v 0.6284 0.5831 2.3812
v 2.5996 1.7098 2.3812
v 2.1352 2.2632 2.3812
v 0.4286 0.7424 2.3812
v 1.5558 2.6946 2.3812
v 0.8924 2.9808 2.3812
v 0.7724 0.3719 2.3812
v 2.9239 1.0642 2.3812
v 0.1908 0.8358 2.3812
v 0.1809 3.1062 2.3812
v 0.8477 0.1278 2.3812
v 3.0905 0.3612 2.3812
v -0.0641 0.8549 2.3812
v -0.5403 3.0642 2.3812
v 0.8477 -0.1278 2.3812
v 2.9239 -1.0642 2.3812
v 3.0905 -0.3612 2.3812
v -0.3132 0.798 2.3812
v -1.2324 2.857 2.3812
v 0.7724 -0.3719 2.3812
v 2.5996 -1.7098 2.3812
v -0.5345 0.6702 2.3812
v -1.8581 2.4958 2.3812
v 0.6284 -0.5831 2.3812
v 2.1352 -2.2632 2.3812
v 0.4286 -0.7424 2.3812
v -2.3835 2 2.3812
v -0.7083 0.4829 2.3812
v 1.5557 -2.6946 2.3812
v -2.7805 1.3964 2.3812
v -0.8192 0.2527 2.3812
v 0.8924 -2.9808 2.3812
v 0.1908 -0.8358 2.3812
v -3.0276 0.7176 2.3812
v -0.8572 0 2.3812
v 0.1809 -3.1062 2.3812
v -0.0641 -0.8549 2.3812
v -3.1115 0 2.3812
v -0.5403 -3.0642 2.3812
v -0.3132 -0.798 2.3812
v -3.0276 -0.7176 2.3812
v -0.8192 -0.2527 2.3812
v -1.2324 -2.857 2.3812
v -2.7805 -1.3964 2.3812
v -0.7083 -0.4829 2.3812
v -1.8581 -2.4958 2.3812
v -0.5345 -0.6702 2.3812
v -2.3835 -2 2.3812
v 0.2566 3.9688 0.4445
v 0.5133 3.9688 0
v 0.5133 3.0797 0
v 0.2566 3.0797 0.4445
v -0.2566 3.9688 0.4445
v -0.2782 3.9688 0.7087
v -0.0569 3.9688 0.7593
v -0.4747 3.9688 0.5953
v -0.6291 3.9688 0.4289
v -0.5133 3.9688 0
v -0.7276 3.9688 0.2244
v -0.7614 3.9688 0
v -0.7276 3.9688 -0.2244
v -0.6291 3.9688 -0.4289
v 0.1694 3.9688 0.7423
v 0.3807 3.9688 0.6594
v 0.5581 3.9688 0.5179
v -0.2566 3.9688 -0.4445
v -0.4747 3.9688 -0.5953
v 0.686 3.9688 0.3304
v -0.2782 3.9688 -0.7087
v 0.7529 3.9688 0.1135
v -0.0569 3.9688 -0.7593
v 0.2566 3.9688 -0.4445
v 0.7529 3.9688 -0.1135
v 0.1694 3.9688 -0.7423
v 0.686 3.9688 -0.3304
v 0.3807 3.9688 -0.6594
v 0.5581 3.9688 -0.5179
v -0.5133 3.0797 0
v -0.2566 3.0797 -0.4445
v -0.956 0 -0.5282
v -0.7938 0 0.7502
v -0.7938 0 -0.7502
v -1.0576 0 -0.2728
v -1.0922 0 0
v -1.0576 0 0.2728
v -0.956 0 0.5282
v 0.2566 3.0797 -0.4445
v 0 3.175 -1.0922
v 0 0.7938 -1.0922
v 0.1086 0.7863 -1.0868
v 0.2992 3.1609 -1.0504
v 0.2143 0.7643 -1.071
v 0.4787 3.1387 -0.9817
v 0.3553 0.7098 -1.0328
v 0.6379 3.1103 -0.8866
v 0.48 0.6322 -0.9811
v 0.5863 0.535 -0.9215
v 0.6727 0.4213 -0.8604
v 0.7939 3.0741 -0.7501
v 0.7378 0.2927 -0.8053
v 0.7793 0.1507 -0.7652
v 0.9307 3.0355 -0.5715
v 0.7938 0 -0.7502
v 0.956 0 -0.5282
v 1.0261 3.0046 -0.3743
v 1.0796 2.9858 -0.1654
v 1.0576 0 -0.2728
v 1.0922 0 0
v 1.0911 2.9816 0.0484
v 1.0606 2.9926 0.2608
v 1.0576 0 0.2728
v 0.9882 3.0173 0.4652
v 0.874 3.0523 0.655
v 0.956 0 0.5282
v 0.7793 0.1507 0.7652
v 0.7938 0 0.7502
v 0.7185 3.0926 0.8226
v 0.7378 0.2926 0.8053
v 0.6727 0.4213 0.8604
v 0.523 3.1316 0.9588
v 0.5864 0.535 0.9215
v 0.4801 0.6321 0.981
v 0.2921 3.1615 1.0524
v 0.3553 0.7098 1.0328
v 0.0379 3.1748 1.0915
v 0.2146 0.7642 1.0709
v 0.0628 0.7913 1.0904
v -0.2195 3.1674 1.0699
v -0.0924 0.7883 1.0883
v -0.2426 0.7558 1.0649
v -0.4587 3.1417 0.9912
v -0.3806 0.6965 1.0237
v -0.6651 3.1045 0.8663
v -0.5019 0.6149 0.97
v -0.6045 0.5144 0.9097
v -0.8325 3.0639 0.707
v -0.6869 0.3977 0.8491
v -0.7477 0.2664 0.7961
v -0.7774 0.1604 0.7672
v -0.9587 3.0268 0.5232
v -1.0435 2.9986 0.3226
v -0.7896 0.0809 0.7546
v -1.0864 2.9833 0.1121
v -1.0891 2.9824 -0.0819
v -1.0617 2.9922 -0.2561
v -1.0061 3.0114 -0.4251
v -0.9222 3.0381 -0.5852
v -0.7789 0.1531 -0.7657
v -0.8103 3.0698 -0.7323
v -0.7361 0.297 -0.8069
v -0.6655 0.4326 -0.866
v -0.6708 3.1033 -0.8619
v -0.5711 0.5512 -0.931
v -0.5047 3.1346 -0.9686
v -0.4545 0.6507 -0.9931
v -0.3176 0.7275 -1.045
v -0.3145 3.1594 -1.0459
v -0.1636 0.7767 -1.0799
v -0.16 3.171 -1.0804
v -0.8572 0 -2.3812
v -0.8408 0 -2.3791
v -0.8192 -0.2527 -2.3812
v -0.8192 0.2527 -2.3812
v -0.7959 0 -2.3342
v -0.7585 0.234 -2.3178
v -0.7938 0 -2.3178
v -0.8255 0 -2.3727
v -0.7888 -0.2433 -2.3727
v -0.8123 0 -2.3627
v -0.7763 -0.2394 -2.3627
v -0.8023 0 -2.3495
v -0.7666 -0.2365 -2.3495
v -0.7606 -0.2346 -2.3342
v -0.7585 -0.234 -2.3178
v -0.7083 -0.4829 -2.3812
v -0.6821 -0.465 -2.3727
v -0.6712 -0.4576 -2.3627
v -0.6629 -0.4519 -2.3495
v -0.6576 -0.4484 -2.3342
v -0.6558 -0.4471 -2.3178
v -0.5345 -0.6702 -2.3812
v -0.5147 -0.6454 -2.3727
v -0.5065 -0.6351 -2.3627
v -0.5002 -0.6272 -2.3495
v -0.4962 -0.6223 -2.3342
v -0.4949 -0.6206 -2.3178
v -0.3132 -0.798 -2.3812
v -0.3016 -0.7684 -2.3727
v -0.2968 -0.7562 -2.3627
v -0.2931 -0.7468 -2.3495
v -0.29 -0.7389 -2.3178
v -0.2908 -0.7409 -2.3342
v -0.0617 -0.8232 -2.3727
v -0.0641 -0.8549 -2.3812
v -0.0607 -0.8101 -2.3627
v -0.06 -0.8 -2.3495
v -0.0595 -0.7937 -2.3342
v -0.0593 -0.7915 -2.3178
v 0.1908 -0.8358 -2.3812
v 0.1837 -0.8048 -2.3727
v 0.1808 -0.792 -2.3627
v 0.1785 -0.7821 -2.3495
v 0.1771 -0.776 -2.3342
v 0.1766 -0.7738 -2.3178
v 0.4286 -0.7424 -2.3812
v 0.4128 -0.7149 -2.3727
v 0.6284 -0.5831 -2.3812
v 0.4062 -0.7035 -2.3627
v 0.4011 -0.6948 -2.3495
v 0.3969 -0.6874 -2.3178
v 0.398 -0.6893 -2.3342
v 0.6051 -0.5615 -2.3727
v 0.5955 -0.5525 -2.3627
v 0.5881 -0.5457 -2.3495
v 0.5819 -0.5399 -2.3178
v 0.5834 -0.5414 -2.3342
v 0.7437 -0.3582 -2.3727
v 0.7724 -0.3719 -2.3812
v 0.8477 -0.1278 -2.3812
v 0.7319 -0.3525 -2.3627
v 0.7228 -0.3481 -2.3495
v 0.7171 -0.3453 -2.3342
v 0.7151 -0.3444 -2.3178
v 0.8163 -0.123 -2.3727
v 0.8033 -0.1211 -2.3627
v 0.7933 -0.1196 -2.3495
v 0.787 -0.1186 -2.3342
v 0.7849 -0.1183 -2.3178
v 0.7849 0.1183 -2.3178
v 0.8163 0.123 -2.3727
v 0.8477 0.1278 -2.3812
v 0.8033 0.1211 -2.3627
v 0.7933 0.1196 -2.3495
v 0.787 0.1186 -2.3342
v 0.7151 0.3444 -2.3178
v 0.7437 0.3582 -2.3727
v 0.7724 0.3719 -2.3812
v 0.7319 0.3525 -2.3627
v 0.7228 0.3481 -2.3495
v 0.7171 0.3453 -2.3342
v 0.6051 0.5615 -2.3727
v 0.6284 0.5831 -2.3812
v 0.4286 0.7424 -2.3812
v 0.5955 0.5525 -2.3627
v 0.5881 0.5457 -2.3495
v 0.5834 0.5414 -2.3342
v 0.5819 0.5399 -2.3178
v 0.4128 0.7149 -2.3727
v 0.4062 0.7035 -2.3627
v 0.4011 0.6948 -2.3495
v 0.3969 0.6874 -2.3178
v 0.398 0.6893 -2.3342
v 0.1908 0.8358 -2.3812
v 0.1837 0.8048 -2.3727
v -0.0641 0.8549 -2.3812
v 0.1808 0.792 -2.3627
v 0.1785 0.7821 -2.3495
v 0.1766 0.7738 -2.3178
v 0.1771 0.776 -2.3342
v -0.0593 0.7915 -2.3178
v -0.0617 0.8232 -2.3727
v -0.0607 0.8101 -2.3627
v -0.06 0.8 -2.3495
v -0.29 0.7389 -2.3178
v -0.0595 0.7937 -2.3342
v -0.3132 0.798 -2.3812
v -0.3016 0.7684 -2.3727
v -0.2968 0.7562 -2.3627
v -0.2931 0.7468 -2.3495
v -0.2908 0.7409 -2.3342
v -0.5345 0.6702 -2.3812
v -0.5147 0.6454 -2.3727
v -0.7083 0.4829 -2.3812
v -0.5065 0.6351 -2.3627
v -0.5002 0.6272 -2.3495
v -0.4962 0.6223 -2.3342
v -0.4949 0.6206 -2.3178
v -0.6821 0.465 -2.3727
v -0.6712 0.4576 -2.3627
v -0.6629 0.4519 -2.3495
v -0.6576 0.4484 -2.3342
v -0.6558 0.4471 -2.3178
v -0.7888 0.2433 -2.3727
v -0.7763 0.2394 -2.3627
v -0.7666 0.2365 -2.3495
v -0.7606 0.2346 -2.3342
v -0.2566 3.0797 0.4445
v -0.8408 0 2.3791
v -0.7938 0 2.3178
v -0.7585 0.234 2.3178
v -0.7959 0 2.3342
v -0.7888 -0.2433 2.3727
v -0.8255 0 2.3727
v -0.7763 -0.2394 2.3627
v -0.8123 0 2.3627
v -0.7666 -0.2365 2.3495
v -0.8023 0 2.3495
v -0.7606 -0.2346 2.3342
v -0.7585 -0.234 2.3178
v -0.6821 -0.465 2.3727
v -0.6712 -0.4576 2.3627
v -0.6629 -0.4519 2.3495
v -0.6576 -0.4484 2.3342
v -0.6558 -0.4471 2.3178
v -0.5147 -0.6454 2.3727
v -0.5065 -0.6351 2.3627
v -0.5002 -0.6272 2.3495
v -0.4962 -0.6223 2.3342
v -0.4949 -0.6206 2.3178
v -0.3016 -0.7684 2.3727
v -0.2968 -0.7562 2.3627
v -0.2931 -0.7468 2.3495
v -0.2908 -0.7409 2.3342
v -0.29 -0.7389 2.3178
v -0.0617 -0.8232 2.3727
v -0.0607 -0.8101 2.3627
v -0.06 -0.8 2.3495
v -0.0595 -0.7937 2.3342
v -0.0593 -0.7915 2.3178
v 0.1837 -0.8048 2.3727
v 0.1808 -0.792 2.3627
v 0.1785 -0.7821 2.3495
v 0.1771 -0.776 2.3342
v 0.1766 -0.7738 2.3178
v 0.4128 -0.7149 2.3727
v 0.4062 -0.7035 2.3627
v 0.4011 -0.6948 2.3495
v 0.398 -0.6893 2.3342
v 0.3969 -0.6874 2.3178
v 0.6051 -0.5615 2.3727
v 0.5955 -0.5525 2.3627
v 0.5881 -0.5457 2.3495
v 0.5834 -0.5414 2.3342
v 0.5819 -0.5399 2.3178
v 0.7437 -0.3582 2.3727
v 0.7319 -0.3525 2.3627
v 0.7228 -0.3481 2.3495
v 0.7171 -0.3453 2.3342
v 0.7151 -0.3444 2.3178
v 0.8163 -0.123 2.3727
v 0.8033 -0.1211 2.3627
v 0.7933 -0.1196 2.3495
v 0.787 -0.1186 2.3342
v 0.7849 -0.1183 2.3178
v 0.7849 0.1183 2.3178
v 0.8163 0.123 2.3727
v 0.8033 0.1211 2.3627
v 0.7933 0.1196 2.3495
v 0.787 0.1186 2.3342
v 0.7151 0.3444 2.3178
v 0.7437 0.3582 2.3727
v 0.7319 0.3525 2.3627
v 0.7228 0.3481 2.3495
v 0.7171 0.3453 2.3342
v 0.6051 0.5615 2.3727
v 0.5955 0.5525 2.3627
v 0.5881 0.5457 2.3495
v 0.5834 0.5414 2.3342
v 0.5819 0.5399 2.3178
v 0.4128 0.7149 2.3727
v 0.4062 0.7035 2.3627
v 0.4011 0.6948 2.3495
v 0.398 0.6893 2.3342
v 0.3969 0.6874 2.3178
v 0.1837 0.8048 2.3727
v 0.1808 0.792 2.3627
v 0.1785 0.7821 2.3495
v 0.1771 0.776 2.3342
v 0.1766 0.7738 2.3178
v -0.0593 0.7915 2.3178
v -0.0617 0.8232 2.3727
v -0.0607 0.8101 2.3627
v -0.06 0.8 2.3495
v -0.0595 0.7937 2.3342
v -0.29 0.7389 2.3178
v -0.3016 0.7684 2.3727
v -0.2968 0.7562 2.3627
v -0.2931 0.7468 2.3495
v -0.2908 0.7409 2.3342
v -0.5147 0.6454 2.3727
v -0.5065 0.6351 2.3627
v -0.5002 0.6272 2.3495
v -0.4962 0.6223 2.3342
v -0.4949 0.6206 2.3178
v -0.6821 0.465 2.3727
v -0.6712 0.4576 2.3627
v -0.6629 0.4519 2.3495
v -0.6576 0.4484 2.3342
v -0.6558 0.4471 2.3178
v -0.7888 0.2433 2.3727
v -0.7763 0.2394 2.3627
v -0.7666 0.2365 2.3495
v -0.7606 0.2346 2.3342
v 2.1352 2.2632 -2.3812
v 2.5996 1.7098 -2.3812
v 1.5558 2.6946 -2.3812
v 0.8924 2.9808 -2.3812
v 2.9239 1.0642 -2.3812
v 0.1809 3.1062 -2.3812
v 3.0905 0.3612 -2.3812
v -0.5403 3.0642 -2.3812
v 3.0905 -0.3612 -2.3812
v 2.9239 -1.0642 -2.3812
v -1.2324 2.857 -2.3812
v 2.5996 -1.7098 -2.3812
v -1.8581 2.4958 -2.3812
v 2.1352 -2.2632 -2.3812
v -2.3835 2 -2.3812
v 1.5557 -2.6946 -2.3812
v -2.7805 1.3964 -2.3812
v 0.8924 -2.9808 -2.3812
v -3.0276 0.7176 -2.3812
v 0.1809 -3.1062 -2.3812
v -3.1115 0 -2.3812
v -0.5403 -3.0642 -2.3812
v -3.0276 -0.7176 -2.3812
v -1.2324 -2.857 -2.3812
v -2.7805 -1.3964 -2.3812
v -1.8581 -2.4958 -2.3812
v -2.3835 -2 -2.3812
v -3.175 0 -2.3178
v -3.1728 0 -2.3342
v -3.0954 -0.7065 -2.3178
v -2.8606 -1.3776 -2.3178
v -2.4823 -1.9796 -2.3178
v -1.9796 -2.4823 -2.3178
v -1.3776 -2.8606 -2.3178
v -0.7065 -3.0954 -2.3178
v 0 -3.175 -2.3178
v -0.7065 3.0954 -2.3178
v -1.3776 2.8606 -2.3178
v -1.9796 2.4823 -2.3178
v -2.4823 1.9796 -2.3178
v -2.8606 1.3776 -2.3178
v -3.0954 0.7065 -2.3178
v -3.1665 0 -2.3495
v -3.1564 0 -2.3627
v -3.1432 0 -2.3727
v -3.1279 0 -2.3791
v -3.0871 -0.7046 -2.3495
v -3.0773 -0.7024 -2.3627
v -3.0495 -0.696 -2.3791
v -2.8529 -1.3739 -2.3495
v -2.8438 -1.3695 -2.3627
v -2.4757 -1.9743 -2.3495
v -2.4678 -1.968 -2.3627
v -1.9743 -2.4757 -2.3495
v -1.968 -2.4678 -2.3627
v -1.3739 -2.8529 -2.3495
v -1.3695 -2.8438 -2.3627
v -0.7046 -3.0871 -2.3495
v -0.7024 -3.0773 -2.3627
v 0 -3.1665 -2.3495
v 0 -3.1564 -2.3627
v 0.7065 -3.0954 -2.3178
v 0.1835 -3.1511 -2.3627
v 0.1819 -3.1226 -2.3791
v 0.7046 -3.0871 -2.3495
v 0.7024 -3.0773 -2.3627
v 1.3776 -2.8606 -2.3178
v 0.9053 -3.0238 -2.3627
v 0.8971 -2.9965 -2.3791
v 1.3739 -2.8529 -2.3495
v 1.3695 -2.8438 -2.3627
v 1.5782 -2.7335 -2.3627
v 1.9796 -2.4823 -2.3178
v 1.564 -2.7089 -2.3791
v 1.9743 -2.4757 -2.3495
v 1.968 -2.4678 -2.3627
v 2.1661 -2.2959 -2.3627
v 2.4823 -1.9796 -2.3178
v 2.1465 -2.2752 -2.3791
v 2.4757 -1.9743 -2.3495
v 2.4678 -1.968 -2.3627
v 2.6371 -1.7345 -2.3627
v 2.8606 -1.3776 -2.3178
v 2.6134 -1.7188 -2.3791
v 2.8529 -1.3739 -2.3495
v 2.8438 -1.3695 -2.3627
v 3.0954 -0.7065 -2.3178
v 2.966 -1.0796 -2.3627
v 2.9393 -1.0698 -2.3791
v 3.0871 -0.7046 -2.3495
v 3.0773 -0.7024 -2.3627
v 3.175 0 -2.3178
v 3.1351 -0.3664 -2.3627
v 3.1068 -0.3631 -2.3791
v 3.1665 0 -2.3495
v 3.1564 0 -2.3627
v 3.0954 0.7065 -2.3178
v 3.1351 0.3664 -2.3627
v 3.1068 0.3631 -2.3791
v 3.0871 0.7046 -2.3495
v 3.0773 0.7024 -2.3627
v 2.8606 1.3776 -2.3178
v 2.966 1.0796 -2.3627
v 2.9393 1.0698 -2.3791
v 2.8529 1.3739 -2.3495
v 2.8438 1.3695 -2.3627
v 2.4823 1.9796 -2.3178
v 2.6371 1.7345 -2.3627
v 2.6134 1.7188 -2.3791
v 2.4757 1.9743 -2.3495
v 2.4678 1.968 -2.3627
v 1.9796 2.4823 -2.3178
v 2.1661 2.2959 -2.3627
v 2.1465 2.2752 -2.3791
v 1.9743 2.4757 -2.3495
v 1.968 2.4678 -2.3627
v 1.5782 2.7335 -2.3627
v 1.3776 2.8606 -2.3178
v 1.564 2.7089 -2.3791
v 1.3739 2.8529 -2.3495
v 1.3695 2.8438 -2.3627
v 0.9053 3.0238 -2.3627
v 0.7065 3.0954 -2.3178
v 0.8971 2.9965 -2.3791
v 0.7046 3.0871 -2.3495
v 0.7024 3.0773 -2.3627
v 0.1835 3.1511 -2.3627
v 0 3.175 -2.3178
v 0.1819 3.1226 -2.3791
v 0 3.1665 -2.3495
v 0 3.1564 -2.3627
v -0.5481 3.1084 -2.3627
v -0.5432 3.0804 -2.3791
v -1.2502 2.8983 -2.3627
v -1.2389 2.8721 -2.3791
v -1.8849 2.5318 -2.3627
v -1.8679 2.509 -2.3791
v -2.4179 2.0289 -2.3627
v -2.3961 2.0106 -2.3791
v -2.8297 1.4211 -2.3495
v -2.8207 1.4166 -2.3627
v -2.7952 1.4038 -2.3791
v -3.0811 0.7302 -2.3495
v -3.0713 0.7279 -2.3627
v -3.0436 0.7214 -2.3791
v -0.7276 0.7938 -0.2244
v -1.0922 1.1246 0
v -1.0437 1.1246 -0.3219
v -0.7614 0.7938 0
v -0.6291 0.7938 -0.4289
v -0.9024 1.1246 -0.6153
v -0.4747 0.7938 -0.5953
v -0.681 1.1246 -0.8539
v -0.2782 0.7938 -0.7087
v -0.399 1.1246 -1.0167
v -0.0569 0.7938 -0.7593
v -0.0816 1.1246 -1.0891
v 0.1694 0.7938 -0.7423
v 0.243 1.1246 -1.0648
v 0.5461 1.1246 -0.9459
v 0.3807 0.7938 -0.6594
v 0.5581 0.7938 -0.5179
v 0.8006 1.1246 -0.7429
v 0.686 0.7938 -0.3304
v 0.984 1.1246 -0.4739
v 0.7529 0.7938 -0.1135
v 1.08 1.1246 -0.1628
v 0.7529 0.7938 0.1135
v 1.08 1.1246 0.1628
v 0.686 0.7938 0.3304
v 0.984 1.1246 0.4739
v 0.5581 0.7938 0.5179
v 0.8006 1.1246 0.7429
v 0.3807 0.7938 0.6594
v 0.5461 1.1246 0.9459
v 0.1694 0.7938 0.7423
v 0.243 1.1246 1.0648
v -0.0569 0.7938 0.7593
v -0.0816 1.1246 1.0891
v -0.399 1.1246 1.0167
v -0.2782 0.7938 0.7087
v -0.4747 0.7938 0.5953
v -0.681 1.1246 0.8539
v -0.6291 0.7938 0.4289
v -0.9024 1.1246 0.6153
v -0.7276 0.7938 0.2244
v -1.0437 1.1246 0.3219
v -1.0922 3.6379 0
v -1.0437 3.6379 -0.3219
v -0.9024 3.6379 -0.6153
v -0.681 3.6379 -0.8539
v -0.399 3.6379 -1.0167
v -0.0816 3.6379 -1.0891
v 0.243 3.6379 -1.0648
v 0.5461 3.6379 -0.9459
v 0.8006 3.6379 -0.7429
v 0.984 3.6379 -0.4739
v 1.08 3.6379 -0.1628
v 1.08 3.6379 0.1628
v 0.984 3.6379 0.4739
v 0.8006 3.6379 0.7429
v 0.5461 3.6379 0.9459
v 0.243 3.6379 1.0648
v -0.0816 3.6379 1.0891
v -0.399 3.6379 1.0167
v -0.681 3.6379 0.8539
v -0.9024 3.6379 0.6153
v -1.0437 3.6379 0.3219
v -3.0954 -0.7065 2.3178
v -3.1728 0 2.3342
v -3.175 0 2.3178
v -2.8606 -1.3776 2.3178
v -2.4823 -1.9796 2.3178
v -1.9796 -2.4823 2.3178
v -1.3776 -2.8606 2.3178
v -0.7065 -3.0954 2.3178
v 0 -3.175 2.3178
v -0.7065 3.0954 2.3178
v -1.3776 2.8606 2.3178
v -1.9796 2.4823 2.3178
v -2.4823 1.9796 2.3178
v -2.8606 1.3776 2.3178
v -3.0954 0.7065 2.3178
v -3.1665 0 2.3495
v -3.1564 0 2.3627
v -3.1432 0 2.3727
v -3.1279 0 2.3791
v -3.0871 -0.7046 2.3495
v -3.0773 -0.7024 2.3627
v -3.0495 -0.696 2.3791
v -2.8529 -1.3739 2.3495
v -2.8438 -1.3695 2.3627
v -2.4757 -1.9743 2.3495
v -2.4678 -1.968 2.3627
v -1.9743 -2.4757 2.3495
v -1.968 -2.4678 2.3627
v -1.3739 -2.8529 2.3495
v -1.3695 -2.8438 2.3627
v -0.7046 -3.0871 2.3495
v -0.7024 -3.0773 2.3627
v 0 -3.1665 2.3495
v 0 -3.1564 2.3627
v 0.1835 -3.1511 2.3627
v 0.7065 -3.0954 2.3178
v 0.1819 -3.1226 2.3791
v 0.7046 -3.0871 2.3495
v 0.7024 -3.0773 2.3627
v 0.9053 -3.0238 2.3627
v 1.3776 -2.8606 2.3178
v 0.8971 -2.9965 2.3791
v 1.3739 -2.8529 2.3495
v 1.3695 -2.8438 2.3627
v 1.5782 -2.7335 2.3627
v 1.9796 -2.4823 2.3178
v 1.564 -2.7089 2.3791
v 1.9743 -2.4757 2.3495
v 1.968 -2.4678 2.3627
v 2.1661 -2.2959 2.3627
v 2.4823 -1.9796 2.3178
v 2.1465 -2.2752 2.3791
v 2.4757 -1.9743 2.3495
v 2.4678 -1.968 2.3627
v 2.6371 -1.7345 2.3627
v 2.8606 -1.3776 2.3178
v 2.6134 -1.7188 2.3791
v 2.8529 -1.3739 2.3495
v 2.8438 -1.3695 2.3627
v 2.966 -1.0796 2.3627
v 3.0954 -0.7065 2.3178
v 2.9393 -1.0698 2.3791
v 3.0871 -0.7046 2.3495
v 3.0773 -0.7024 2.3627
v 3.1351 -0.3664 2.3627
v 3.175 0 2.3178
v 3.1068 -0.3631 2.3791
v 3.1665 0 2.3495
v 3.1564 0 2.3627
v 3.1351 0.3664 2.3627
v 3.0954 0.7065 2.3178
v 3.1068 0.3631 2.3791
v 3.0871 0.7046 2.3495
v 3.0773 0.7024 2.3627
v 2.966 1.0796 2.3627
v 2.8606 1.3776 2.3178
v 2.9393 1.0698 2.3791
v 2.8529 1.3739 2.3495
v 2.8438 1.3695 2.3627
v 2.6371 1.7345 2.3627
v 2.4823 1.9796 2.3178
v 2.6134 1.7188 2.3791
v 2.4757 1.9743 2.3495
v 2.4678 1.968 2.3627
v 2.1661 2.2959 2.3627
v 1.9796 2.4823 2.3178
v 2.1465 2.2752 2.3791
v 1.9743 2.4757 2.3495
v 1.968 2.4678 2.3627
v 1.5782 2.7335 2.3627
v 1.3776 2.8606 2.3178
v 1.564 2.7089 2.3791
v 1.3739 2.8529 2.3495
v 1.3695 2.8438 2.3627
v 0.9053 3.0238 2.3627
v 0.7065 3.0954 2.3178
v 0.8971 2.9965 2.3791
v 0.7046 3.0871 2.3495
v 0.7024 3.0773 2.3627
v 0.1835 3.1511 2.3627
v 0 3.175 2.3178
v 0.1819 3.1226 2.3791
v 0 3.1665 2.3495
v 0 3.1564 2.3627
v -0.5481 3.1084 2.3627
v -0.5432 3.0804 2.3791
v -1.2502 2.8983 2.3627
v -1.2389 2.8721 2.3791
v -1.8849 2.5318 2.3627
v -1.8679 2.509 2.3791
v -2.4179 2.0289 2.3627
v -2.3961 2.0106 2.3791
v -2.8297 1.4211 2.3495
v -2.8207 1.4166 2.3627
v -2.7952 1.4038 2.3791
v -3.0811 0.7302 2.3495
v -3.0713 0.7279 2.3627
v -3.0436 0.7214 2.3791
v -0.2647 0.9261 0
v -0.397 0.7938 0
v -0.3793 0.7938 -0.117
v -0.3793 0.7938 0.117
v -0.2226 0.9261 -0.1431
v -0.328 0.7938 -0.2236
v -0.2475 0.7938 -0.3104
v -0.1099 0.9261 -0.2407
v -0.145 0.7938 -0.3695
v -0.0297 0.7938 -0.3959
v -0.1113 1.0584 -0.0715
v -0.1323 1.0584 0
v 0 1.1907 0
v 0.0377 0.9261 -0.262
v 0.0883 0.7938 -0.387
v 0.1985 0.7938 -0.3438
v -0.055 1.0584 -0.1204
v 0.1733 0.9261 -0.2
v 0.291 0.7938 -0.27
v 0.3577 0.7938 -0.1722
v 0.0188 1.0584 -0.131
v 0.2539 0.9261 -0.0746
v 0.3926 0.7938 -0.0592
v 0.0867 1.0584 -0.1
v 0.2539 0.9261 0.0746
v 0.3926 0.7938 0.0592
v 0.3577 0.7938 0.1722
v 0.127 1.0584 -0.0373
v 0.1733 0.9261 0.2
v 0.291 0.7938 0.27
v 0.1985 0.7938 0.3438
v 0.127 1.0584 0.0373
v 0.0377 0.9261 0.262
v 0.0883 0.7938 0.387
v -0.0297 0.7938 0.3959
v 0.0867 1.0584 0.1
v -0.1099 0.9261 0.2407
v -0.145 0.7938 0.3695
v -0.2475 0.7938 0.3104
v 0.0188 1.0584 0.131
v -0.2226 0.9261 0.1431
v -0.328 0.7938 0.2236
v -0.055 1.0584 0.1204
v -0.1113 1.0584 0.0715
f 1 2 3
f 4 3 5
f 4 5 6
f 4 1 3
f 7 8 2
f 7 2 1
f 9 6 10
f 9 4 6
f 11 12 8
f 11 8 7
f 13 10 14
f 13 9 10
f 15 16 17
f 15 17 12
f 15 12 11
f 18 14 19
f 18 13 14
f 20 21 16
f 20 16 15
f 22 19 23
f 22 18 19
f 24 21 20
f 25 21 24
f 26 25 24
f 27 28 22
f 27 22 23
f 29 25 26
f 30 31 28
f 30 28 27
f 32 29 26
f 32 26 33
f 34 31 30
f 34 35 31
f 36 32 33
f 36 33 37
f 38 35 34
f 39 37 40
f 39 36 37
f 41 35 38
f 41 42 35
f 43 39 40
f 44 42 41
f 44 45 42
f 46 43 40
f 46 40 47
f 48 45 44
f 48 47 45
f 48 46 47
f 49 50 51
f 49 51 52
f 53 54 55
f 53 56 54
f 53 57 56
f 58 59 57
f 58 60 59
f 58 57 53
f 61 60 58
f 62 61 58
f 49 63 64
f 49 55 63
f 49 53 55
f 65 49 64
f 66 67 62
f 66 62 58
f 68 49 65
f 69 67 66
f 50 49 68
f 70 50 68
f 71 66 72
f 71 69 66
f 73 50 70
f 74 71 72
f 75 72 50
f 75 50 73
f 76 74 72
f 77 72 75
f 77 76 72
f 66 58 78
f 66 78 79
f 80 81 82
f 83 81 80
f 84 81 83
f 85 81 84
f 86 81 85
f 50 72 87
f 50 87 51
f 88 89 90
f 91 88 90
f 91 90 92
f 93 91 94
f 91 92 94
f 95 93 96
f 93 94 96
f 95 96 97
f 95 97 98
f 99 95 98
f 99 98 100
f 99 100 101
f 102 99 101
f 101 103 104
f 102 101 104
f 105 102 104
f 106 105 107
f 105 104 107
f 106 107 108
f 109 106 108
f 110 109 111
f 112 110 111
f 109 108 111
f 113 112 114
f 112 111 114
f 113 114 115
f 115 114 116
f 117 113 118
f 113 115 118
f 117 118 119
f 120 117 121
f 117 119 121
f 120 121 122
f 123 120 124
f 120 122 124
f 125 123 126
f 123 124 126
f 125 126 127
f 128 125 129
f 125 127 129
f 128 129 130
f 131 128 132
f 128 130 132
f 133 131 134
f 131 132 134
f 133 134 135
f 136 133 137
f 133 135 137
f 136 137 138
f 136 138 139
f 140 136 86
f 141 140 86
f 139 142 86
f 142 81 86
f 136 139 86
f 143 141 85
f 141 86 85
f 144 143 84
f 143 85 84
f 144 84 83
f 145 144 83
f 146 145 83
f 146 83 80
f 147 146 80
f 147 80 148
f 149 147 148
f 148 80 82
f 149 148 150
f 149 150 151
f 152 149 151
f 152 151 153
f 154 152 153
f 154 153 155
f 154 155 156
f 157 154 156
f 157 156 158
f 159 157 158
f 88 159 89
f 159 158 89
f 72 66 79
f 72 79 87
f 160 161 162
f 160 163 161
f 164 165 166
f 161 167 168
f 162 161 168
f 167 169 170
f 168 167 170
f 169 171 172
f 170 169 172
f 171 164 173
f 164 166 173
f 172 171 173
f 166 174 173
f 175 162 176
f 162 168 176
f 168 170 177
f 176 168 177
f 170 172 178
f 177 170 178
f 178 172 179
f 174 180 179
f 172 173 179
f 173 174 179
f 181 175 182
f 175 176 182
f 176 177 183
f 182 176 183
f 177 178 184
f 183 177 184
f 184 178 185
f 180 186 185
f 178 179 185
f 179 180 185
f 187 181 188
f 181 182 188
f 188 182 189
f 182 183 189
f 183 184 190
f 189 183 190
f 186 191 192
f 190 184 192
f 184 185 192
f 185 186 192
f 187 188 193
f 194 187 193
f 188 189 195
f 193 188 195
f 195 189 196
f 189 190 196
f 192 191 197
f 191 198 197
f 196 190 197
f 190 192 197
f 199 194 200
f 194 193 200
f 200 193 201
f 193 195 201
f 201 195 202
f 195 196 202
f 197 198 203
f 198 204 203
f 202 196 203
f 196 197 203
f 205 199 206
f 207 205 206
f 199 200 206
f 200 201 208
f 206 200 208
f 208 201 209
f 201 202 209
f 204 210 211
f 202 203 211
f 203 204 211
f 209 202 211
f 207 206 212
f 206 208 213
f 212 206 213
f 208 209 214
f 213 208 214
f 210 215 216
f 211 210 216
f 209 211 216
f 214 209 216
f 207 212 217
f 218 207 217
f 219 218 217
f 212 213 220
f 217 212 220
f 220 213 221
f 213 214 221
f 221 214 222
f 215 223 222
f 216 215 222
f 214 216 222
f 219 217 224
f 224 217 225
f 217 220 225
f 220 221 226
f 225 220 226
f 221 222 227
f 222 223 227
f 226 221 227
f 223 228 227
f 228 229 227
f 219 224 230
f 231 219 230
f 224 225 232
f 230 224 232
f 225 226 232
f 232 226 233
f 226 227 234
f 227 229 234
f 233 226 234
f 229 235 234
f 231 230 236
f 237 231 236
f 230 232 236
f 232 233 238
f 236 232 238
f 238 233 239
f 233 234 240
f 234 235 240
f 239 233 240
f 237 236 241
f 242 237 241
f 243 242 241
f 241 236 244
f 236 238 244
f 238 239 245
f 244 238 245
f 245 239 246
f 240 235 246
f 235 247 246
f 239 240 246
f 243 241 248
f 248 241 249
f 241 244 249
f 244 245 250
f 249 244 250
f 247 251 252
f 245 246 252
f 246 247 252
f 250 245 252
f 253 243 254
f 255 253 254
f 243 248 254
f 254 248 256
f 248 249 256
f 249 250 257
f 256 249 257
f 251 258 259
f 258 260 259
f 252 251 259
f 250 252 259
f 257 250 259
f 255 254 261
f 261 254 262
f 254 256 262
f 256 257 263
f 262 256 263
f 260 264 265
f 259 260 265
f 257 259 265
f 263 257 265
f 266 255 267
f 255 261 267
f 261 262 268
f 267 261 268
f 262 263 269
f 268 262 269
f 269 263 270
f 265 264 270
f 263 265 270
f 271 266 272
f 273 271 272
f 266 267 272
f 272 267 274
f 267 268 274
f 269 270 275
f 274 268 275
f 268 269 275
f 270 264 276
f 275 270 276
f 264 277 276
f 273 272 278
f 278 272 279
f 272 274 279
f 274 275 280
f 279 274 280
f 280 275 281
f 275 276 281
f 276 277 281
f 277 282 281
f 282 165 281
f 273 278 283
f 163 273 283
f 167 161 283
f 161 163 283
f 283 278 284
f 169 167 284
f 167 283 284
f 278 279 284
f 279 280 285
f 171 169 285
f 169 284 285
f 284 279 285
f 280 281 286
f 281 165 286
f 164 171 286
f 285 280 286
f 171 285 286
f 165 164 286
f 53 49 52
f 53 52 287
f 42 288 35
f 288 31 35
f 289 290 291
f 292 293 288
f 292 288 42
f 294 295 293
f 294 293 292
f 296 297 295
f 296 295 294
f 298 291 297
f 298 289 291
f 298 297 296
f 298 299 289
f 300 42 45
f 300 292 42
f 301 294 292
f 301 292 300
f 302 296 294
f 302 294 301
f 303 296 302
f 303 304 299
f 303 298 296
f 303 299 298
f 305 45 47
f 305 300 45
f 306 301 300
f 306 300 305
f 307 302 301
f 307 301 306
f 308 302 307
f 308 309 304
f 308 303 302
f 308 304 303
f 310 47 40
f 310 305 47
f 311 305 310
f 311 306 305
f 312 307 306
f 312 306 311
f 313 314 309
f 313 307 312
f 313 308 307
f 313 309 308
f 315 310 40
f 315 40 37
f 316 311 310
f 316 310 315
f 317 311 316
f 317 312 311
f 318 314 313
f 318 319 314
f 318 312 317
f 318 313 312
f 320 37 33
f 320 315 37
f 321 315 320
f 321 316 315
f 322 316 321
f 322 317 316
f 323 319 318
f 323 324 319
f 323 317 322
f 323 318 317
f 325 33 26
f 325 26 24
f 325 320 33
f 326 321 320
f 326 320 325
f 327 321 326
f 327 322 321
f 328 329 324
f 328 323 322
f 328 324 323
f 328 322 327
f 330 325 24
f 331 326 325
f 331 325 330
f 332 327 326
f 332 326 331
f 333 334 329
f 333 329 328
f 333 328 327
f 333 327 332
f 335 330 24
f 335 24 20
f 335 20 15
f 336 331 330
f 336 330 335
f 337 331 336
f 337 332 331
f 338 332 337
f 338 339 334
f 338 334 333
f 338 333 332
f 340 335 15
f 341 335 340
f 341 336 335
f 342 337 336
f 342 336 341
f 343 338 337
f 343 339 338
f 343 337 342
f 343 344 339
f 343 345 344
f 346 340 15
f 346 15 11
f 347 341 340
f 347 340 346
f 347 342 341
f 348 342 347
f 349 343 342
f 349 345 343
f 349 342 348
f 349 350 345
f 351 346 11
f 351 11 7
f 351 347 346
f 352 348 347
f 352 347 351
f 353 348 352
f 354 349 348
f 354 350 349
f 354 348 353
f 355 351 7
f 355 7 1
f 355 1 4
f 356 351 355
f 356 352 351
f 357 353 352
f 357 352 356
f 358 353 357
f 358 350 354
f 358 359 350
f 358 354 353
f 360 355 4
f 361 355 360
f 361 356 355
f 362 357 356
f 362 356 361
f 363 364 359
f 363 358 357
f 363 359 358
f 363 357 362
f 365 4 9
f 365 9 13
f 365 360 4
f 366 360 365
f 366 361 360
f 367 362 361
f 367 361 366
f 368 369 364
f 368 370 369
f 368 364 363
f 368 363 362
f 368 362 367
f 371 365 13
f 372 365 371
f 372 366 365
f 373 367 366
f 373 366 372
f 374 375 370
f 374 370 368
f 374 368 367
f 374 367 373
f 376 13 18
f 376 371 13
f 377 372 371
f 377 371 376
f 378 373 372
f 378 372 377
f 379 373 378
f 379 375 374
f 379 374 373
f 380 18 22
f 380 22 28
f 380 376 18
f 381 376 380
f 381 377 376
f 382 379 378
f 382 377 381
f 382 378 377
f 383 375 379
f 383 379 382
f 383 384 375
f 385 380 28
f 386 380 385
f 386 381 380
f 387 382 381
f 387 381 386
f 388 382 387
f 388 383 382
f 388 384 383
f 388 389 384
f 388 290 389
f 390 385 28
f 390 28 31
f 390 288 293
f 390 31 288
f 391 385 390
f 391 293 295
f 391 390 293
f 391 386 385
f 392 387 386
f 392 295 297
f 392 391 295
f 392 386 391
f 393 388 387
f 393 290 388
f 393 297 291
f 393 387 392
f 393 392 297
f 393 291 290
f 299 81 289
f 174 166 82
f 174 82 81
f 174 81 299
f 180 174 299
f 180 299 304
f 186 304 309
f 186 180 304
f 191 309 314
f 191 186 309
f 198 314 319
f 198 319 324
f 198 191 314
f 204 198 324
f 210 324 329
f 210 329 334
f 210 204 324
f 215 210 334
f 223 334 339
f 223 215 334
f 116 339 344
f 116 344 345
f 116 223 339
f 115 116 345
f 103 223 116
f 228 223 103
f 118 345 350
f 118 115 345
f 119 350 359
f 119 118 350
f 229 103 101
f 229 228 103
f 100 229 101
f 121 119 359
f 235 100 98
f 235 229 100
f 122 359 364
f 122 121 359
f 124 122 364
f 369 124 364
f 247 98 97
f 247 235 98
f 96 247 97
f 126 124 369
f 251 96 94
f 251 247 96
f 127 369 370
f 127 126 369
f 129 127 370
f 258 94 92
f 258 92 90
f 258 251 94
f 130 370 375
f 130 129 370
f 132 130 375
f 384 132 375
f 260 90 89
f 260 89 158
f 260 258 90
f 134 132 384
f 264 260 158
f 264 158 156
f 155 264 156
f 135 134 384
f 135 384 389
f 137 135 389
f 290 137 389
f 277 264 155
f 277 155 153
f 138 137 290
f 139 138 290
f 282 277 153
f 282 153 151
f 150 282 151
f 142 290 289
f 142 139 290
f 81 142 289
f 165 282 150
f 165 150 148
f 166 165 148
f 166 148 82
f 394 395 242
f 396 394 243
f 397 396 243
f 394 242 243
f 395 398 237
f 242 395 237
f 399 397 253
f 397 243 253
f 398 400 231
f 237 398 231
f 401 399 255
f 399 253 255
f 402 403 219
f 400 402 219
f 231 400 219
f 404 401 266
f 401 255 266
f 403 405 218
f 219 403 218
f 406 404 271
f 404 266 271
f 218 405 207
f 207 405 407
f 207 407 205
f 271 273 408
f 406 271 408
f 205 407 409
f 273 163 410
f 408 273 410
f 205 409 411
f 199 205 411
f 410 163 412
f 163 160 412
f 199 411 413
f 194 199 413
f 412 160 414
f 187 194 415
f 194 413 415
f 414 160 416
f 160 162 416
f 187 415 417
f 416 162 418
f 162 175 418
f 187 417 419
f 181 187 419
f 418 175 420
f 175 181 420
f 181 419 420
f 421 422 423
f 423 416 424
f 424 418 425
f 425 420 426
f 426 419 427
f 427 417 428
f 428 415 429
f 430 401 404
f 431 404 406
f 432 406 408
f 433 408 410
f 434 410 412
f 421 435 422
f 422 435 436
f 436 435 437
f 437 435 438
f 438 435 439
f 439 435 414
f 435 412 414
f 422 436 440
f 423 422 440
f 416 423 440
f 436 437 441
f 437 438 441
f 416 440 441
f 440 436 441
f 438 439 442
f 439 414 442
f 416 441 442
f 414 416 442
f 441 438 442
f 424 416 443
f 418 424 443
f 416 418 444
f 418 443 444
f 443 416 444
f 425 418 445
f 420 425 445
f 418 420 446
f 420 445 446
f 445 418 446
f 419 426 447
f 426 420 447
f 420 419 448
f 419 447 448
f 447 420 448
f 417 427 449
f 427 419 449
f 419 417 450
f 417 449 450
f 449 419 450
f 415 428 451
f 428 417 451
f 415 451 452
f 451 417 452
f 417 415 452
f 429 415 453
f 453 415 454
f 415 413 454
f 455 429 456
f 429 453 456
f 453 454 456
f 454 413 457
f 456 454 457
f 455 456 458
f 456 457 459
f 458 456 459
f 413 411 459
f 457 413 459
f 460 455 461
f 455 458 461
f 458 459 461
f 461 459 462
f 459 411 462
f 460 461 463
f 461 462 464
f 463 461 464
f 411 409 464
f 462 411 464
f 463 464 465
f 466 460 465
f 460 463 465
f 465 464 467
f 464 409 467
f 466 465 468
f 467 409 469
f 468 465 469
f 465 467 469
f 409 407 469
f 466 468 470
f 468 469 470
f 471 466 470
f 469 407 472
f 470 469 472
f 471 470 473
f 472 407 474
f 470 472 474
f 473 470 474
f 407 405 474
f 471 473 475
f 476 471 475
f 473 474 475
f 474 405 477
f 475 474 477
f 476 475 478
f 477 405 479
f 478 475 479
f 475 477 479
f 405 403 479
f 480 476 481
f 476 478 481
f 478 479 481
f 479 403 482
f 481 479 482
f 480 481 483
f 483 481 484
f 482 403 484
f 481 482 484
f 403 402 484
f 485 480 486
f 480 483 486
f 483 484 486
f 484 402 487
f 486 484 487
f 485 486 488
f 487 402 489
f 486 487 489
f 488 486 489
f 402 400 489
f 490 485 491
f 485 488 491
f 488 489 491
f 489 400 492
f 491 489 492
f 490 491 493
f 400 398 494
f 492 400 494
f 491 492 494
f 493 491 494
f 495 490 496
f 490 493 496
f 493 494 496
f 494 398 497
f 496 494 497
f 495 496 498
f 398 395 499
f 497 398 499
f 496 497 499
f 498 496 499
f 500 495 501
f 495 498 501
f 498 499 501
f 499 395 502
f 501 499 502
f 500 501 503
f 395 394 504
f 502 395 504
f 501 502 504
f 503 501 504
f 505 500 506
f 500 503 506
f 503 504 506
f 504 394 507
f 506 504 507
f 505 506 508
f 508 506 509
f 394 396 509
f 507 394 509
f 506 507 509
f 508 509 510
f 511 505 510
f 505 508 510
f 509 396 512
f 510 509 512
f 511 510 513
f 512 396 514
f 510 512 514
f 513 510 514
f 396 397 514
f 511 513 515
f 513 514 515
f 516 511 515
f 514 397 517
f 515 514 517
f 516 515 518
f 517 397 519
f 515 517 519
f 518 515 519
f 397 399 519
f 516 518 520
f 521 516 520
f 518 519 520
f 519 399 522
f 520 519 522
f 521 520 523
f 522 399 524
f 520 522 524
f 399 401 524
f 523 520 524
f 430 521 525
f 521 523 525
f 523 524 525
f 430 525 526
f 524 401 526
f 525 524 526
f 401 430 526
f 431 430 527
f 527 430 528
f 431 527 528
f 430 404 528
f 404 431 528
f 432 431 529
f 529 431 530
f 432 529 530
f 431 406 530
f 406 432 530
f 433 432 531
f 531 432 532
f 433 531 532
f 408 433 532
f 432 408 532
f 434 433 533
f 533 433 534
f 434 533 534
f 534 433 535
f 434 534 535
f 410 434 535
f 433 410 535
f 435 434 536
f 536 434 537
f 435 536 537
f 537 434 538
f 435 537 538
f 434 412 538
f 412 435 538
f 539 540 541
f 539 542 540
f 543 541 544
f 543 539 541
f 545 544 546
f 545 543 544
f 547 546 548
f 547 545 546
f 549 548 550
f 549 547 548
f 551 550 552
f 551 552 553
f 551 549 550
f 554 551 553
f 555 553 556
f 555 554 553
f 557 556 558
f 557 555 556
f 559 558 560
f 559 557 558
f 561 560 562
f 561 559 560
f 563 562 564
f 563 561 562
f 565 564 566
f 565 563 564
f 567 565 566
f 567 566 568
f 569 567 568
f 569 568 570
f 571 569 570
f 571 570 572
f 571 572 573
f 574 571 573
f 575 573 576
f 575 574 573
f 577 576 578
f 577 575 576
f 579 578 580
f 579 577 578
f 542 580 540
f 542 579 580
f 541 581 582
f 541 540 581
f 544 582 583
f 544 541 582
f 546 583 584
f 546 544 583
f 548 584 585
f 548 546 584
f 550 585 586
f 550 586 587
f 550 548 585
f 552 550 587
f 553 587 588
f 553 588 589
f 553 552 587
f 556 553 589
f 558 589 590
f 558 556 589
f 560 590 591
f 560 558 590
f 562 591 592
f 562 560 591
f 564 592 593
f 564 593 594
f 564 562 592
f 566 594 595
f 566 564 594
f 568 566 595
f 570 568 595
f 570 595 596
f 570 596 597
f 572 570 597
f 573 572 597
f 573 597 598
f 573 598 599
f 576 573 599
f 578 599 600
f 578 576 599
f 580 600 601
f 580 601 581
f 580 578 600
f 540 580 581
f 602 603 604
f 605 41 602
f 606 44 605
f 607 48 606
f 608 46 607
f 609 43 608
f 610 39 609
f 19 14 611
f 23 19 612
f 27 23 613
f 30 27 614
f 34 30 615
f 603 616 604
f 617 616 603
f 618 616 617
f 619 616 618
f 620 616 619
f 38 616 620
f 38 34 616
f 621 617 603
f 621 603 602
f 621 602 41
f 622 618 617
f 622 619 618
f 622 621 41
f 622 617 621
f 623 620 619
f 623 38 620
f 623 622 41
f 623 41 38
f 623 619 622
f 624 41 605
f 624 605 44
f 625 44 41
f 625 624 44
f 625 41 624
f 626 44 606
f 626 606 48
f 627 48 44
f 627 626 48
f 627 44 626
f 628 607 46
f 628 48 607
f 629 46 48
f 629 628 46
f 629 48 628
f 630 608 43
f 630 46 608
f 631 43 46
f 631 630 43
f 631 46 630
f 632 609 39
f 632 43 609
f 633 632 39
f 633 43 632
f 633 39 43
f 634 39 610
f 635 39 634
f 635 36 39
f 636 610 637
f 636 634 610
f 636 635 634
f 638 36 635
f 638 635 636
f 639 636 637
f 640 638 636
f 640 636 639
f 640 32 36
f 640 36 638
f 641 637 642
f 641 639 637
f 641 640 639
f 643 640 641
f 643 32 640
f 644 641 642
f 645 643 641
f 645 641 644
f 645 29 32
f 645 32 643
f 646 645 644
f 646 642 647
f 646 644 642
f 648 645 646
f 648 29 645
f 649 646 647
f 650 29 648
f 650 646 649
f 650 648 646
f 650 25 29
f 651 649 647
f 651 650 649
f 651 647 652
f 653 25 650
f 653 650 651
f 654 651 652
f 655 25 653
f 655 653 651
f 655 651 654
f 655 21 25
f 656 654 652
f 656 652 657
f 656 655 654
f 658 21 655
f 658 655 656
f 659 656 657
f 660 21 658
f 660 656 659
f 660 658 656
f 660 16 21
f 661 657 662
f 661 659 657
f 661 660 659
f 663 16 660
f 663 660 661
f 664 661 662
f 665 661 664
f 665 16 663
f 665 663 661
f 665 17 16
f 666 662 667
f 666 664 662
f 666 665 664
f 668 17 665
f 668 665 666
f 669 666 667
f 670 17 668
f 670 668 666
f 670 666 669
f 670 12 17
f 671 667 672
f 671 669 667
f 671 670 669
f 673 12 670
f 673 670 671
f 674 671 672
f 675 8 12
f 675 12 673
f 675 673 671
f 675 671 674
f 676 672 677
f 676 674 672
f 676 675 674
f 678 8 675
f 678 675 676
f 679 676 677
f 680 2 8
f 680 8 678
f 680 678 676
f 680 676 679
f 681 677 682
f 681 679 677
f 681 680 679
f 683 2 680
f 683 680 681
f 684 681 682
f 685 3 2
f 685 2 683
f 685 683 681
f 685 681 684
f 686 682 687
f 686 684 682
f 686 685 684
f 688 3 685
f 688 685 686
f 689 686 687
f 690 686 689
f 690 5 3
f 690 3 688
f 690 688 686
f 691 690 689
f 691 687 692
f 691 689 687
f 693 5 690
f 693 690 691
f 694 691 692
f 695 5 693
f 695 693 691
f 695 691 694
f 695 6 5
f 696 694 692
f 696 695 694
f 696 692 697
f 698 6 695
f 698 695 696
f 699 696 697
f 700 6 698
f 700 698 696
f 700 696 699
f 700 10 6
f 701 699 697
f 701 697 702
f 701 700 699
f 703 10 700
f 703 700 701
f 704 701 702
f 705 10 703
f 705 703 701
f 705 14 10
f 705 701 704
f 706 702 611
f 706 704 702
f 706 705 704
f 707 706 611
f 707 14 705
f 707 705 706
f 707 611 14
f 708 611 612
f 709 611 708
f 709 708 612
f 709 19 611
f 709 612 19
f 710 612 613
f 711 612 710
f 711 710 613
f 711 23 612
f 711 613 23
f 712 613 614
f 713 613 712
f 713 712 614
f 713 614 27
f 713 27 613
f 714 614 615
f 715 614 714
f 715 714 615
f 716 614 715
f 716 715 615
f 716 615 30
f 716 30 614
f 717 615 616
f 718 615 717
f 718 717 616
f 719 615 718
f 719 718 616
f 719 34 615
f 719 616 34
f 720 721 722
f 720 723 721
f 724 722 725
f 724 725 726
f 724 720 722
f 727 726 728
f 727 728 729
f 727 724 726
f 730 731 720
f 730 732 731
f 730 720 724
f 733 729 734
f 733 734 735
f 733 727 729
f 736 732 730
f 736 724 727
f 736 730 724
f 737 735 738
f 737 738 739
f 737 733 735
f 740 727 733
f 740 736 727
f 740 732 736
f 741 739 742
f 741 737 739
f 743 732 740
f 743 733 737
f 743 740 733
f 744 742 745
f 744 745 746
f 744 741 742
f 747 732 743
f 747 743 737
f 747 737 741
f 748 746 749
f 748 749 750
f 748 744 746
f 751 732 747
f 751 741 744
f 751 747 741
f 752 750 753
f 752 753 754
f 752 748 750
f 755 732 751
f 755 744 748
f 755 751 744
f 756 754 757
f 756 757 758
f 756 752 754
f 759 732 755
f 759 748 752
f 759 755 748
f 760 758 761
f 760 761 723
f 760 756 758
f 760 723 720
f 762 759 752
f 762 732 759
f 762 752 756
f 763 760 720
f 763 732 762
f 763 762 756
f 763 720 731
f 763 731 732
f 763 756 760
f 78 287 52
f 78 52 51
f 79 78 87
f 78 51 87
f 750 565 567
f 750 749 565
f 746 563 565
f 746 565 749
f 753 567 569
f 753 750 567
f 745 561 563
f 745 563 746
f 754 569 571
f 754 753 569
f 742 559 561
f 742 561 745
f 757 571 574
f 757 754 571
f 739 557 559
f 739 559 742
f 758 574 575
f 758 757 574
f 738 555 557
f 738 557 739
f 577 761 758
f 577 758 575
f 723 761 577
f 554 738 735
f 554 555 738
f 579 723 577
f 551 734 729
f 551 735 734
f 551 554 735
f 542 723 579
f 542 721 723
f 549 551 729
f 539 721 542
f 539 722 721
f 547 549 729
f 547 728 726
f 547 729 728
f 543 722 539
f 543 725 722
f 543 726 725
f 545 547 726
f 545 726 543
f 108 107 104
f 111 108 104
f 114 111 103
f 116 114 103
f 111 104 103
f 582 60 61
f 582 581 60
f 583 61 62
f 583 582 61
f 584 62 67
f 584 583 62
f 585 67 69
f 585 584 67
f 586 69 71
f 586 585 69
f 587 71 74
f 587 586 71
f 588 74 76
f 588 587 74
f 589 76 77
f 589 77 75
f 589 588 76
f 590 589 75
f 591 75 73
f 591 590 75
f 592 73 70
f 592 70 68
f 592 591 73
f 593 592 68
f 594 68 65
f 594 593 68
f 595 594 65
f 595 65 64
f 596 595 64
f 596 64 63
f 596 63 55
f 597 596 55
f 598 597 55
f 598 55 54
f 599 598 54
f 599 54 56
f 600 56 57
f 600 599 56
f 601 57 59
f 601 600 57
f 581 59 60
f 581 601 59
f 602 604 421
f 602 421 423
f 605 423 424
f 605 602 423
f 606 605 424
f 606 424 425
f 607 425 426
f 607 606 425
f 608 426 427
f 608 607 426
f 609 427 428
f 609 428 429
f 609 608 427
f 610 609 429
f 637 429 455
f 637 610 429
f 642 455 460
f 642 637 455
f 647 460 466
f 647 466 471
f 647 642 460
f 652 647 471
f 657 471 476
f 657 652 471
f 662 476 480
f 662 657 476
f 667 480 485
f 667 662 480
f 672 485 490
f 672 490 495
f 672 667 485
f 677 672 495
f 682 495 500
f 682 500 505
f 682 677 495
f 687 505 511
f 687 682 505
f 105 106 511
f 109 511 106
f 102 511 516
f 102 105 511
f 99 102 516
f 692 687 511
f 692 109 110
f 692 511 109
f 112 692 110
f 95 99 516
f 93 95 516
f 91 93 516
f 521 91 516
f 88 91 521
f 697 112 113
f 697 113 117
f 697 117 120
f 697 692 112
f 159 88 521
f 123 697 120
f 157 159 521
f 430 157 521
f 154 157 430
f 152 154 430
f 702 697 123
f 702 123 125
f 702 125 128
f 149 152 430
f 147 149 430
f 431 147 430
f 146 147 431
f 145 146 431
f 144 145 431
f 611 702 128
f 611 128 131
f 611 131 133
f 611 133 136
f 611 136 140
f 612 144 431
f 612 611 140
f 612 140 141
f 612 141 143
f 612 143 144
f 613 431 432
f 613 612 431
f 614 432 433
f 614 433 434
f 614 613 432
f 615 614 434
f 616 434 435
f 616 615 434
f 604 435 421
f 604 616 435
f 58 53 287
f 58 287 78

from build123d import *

# Parameters (mm, degrees)
SKETCH1_R          = 3.175
SKETCH1_R_2        = 0.79375
EXTRUDE1_DEPTH     = 2.38125
SKETCH2_R          = 1.0922
CUT_EXTRUDE1_DEPTH = 45.62682463
FILLET1_R          = 0.0635
CUT_EXTRUDE2_DEPTH = 0.889


with BuildPart() as part:
    # Sketch1 → Extrude1 (new, symmetric)
    with BuildSketch(Plane.XY):
        with Locations(Location((0, 0, 0), (0, 0, 180))):
            Circle(SKETCH1_R)
        with Locations(Location((0, 0, 0), (0, 0, 180))):
            Circle(SKETCH1_R_2, mode=Mode.SUBTRACT)
    extrude(amount=EXTRUDE1_DEPTH, both=True)

    # Sketch2 → Cut-Extrude1 (cut, through all)
    with BuildSketch(Plane(origin=(41.275, 0, 0), x_dir=(0, 0, -1), z_dir=(0, -1, 0))):
        with Locations((0, -41.275)):
            Circle(SKETCH2_R)
    extrude(amount=-CUT_EXTRUDE1_DEPTH, mode=Mode.SUBTRACT)

    # Fillet1
    fillet1_edges = [part.edges().sort_by_distance(p)[0] for p in [
        (3.175, 0, -2.38125),
        (3.175, 0, 2.38125),
        (0.79375, 0, -2.38125),
        (0.79375, 0, 2.38125),
    ]]
    fillet(fillet1_edges, radius=FILLET1_R)


with BuildPart() as body_2:
    # Sketch3 → Revolve1 (revolve)
    with BuildSketch(Plane.XY):
        Polygon((-0.761379651, 0.79375), (-0.396984419, 0.79375), (0, 1.190734419), (0, 3.96875), (-0.761379651, 3.96875), (-1.0922, 3.637929651), (-1.0922, 1.124570349), align=None)
    revolve(axis=Axis((0, 0.79375, 0), (0, -1, 0)))

    # Sketch4 → Cut-Extrude2 (cut)
    with BuildSketch(Plane(origin=(3.3734375, 3.96875, 0), x_dir=(0, 0, -1), z_dir=(0, -1, 0))):
        Polygon((0, -2.860173111), (-0.4445, -3.116805305), (-0.4445, -3.630069695), (0, -3.886701889), (0.4445, -3.630069695), (0.4445, -3.116805305), align=None)
    extrude(amount=CUT_EXTRUDE2_DEPTH, mode=Mode.SUBTRACT)


solid = Compound([part.part, body_2.part])
